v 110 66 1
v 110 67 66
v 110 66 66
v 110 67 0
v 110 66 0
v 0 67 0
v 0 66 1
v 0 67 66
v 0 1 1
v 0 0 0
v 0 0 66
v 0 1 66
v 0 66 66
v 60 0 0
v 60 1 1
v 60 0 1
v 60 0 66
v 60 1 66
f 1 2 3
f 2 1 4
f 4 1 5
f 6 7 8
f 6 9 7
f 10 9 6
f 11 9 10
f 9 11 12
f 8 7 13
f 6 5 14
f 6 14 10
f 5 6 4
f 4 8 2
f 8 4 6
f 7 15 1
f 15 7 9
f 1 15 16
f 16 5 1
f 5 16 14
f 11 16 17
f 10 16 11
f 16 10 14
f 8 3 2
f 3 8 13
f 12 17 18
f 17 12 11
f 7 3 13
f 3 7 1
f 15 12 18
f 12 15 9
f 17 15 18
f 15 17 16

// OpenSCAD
width = 155;
wall_height = 70;
wall_thickness = 1;
bar_thickness = 5;
gap_thickness = 10;
spout_gap = 110;

module bar()
  square([width, bar_thickness]);

module wall()
  cube([width, wall_thickness, wall_height]);

module outer_walls() {
  wall();
  translate([wall_thickness, 0])
    rotate(90, [0, 0, 1])
      wall();
  translate([width, 0])
    rotate(90, [0, 0, 1])
      difference() {
        wall();
        cube([spout_gap, wall_thickness, wall_height]);
      }
  translate([0, width - wall_thickness])
      wall();
}

module grid() {
  for (i = [0 : bar_thickness + gap_thickness : width])
    translate([0, i])
      bar();
}

// outer_walls();
// linear_extrude(wall_thickness) {
//   grid();
//   translate([width, 0])
//     rotate(90, [0, 0, 1])
//       grid();
// }

module drain_spout() {
  inner_width = 65;
  short_length = 60;
  long_length = 110;

  module side_profiles() {
    square([short_length, wall_thickness]);
    translate([0, inner_width + wall_thickness])
      square([long_length, wall_thickness]);
  }

  module bottom()
    linear_extrude(wall_thickness)
      hull()
        side_profiles();

  module sides()
    linear_extrude(wall_thickness + inner_width)
      side_profiles();

  bottom();
  sides();
}

drain_spout();
